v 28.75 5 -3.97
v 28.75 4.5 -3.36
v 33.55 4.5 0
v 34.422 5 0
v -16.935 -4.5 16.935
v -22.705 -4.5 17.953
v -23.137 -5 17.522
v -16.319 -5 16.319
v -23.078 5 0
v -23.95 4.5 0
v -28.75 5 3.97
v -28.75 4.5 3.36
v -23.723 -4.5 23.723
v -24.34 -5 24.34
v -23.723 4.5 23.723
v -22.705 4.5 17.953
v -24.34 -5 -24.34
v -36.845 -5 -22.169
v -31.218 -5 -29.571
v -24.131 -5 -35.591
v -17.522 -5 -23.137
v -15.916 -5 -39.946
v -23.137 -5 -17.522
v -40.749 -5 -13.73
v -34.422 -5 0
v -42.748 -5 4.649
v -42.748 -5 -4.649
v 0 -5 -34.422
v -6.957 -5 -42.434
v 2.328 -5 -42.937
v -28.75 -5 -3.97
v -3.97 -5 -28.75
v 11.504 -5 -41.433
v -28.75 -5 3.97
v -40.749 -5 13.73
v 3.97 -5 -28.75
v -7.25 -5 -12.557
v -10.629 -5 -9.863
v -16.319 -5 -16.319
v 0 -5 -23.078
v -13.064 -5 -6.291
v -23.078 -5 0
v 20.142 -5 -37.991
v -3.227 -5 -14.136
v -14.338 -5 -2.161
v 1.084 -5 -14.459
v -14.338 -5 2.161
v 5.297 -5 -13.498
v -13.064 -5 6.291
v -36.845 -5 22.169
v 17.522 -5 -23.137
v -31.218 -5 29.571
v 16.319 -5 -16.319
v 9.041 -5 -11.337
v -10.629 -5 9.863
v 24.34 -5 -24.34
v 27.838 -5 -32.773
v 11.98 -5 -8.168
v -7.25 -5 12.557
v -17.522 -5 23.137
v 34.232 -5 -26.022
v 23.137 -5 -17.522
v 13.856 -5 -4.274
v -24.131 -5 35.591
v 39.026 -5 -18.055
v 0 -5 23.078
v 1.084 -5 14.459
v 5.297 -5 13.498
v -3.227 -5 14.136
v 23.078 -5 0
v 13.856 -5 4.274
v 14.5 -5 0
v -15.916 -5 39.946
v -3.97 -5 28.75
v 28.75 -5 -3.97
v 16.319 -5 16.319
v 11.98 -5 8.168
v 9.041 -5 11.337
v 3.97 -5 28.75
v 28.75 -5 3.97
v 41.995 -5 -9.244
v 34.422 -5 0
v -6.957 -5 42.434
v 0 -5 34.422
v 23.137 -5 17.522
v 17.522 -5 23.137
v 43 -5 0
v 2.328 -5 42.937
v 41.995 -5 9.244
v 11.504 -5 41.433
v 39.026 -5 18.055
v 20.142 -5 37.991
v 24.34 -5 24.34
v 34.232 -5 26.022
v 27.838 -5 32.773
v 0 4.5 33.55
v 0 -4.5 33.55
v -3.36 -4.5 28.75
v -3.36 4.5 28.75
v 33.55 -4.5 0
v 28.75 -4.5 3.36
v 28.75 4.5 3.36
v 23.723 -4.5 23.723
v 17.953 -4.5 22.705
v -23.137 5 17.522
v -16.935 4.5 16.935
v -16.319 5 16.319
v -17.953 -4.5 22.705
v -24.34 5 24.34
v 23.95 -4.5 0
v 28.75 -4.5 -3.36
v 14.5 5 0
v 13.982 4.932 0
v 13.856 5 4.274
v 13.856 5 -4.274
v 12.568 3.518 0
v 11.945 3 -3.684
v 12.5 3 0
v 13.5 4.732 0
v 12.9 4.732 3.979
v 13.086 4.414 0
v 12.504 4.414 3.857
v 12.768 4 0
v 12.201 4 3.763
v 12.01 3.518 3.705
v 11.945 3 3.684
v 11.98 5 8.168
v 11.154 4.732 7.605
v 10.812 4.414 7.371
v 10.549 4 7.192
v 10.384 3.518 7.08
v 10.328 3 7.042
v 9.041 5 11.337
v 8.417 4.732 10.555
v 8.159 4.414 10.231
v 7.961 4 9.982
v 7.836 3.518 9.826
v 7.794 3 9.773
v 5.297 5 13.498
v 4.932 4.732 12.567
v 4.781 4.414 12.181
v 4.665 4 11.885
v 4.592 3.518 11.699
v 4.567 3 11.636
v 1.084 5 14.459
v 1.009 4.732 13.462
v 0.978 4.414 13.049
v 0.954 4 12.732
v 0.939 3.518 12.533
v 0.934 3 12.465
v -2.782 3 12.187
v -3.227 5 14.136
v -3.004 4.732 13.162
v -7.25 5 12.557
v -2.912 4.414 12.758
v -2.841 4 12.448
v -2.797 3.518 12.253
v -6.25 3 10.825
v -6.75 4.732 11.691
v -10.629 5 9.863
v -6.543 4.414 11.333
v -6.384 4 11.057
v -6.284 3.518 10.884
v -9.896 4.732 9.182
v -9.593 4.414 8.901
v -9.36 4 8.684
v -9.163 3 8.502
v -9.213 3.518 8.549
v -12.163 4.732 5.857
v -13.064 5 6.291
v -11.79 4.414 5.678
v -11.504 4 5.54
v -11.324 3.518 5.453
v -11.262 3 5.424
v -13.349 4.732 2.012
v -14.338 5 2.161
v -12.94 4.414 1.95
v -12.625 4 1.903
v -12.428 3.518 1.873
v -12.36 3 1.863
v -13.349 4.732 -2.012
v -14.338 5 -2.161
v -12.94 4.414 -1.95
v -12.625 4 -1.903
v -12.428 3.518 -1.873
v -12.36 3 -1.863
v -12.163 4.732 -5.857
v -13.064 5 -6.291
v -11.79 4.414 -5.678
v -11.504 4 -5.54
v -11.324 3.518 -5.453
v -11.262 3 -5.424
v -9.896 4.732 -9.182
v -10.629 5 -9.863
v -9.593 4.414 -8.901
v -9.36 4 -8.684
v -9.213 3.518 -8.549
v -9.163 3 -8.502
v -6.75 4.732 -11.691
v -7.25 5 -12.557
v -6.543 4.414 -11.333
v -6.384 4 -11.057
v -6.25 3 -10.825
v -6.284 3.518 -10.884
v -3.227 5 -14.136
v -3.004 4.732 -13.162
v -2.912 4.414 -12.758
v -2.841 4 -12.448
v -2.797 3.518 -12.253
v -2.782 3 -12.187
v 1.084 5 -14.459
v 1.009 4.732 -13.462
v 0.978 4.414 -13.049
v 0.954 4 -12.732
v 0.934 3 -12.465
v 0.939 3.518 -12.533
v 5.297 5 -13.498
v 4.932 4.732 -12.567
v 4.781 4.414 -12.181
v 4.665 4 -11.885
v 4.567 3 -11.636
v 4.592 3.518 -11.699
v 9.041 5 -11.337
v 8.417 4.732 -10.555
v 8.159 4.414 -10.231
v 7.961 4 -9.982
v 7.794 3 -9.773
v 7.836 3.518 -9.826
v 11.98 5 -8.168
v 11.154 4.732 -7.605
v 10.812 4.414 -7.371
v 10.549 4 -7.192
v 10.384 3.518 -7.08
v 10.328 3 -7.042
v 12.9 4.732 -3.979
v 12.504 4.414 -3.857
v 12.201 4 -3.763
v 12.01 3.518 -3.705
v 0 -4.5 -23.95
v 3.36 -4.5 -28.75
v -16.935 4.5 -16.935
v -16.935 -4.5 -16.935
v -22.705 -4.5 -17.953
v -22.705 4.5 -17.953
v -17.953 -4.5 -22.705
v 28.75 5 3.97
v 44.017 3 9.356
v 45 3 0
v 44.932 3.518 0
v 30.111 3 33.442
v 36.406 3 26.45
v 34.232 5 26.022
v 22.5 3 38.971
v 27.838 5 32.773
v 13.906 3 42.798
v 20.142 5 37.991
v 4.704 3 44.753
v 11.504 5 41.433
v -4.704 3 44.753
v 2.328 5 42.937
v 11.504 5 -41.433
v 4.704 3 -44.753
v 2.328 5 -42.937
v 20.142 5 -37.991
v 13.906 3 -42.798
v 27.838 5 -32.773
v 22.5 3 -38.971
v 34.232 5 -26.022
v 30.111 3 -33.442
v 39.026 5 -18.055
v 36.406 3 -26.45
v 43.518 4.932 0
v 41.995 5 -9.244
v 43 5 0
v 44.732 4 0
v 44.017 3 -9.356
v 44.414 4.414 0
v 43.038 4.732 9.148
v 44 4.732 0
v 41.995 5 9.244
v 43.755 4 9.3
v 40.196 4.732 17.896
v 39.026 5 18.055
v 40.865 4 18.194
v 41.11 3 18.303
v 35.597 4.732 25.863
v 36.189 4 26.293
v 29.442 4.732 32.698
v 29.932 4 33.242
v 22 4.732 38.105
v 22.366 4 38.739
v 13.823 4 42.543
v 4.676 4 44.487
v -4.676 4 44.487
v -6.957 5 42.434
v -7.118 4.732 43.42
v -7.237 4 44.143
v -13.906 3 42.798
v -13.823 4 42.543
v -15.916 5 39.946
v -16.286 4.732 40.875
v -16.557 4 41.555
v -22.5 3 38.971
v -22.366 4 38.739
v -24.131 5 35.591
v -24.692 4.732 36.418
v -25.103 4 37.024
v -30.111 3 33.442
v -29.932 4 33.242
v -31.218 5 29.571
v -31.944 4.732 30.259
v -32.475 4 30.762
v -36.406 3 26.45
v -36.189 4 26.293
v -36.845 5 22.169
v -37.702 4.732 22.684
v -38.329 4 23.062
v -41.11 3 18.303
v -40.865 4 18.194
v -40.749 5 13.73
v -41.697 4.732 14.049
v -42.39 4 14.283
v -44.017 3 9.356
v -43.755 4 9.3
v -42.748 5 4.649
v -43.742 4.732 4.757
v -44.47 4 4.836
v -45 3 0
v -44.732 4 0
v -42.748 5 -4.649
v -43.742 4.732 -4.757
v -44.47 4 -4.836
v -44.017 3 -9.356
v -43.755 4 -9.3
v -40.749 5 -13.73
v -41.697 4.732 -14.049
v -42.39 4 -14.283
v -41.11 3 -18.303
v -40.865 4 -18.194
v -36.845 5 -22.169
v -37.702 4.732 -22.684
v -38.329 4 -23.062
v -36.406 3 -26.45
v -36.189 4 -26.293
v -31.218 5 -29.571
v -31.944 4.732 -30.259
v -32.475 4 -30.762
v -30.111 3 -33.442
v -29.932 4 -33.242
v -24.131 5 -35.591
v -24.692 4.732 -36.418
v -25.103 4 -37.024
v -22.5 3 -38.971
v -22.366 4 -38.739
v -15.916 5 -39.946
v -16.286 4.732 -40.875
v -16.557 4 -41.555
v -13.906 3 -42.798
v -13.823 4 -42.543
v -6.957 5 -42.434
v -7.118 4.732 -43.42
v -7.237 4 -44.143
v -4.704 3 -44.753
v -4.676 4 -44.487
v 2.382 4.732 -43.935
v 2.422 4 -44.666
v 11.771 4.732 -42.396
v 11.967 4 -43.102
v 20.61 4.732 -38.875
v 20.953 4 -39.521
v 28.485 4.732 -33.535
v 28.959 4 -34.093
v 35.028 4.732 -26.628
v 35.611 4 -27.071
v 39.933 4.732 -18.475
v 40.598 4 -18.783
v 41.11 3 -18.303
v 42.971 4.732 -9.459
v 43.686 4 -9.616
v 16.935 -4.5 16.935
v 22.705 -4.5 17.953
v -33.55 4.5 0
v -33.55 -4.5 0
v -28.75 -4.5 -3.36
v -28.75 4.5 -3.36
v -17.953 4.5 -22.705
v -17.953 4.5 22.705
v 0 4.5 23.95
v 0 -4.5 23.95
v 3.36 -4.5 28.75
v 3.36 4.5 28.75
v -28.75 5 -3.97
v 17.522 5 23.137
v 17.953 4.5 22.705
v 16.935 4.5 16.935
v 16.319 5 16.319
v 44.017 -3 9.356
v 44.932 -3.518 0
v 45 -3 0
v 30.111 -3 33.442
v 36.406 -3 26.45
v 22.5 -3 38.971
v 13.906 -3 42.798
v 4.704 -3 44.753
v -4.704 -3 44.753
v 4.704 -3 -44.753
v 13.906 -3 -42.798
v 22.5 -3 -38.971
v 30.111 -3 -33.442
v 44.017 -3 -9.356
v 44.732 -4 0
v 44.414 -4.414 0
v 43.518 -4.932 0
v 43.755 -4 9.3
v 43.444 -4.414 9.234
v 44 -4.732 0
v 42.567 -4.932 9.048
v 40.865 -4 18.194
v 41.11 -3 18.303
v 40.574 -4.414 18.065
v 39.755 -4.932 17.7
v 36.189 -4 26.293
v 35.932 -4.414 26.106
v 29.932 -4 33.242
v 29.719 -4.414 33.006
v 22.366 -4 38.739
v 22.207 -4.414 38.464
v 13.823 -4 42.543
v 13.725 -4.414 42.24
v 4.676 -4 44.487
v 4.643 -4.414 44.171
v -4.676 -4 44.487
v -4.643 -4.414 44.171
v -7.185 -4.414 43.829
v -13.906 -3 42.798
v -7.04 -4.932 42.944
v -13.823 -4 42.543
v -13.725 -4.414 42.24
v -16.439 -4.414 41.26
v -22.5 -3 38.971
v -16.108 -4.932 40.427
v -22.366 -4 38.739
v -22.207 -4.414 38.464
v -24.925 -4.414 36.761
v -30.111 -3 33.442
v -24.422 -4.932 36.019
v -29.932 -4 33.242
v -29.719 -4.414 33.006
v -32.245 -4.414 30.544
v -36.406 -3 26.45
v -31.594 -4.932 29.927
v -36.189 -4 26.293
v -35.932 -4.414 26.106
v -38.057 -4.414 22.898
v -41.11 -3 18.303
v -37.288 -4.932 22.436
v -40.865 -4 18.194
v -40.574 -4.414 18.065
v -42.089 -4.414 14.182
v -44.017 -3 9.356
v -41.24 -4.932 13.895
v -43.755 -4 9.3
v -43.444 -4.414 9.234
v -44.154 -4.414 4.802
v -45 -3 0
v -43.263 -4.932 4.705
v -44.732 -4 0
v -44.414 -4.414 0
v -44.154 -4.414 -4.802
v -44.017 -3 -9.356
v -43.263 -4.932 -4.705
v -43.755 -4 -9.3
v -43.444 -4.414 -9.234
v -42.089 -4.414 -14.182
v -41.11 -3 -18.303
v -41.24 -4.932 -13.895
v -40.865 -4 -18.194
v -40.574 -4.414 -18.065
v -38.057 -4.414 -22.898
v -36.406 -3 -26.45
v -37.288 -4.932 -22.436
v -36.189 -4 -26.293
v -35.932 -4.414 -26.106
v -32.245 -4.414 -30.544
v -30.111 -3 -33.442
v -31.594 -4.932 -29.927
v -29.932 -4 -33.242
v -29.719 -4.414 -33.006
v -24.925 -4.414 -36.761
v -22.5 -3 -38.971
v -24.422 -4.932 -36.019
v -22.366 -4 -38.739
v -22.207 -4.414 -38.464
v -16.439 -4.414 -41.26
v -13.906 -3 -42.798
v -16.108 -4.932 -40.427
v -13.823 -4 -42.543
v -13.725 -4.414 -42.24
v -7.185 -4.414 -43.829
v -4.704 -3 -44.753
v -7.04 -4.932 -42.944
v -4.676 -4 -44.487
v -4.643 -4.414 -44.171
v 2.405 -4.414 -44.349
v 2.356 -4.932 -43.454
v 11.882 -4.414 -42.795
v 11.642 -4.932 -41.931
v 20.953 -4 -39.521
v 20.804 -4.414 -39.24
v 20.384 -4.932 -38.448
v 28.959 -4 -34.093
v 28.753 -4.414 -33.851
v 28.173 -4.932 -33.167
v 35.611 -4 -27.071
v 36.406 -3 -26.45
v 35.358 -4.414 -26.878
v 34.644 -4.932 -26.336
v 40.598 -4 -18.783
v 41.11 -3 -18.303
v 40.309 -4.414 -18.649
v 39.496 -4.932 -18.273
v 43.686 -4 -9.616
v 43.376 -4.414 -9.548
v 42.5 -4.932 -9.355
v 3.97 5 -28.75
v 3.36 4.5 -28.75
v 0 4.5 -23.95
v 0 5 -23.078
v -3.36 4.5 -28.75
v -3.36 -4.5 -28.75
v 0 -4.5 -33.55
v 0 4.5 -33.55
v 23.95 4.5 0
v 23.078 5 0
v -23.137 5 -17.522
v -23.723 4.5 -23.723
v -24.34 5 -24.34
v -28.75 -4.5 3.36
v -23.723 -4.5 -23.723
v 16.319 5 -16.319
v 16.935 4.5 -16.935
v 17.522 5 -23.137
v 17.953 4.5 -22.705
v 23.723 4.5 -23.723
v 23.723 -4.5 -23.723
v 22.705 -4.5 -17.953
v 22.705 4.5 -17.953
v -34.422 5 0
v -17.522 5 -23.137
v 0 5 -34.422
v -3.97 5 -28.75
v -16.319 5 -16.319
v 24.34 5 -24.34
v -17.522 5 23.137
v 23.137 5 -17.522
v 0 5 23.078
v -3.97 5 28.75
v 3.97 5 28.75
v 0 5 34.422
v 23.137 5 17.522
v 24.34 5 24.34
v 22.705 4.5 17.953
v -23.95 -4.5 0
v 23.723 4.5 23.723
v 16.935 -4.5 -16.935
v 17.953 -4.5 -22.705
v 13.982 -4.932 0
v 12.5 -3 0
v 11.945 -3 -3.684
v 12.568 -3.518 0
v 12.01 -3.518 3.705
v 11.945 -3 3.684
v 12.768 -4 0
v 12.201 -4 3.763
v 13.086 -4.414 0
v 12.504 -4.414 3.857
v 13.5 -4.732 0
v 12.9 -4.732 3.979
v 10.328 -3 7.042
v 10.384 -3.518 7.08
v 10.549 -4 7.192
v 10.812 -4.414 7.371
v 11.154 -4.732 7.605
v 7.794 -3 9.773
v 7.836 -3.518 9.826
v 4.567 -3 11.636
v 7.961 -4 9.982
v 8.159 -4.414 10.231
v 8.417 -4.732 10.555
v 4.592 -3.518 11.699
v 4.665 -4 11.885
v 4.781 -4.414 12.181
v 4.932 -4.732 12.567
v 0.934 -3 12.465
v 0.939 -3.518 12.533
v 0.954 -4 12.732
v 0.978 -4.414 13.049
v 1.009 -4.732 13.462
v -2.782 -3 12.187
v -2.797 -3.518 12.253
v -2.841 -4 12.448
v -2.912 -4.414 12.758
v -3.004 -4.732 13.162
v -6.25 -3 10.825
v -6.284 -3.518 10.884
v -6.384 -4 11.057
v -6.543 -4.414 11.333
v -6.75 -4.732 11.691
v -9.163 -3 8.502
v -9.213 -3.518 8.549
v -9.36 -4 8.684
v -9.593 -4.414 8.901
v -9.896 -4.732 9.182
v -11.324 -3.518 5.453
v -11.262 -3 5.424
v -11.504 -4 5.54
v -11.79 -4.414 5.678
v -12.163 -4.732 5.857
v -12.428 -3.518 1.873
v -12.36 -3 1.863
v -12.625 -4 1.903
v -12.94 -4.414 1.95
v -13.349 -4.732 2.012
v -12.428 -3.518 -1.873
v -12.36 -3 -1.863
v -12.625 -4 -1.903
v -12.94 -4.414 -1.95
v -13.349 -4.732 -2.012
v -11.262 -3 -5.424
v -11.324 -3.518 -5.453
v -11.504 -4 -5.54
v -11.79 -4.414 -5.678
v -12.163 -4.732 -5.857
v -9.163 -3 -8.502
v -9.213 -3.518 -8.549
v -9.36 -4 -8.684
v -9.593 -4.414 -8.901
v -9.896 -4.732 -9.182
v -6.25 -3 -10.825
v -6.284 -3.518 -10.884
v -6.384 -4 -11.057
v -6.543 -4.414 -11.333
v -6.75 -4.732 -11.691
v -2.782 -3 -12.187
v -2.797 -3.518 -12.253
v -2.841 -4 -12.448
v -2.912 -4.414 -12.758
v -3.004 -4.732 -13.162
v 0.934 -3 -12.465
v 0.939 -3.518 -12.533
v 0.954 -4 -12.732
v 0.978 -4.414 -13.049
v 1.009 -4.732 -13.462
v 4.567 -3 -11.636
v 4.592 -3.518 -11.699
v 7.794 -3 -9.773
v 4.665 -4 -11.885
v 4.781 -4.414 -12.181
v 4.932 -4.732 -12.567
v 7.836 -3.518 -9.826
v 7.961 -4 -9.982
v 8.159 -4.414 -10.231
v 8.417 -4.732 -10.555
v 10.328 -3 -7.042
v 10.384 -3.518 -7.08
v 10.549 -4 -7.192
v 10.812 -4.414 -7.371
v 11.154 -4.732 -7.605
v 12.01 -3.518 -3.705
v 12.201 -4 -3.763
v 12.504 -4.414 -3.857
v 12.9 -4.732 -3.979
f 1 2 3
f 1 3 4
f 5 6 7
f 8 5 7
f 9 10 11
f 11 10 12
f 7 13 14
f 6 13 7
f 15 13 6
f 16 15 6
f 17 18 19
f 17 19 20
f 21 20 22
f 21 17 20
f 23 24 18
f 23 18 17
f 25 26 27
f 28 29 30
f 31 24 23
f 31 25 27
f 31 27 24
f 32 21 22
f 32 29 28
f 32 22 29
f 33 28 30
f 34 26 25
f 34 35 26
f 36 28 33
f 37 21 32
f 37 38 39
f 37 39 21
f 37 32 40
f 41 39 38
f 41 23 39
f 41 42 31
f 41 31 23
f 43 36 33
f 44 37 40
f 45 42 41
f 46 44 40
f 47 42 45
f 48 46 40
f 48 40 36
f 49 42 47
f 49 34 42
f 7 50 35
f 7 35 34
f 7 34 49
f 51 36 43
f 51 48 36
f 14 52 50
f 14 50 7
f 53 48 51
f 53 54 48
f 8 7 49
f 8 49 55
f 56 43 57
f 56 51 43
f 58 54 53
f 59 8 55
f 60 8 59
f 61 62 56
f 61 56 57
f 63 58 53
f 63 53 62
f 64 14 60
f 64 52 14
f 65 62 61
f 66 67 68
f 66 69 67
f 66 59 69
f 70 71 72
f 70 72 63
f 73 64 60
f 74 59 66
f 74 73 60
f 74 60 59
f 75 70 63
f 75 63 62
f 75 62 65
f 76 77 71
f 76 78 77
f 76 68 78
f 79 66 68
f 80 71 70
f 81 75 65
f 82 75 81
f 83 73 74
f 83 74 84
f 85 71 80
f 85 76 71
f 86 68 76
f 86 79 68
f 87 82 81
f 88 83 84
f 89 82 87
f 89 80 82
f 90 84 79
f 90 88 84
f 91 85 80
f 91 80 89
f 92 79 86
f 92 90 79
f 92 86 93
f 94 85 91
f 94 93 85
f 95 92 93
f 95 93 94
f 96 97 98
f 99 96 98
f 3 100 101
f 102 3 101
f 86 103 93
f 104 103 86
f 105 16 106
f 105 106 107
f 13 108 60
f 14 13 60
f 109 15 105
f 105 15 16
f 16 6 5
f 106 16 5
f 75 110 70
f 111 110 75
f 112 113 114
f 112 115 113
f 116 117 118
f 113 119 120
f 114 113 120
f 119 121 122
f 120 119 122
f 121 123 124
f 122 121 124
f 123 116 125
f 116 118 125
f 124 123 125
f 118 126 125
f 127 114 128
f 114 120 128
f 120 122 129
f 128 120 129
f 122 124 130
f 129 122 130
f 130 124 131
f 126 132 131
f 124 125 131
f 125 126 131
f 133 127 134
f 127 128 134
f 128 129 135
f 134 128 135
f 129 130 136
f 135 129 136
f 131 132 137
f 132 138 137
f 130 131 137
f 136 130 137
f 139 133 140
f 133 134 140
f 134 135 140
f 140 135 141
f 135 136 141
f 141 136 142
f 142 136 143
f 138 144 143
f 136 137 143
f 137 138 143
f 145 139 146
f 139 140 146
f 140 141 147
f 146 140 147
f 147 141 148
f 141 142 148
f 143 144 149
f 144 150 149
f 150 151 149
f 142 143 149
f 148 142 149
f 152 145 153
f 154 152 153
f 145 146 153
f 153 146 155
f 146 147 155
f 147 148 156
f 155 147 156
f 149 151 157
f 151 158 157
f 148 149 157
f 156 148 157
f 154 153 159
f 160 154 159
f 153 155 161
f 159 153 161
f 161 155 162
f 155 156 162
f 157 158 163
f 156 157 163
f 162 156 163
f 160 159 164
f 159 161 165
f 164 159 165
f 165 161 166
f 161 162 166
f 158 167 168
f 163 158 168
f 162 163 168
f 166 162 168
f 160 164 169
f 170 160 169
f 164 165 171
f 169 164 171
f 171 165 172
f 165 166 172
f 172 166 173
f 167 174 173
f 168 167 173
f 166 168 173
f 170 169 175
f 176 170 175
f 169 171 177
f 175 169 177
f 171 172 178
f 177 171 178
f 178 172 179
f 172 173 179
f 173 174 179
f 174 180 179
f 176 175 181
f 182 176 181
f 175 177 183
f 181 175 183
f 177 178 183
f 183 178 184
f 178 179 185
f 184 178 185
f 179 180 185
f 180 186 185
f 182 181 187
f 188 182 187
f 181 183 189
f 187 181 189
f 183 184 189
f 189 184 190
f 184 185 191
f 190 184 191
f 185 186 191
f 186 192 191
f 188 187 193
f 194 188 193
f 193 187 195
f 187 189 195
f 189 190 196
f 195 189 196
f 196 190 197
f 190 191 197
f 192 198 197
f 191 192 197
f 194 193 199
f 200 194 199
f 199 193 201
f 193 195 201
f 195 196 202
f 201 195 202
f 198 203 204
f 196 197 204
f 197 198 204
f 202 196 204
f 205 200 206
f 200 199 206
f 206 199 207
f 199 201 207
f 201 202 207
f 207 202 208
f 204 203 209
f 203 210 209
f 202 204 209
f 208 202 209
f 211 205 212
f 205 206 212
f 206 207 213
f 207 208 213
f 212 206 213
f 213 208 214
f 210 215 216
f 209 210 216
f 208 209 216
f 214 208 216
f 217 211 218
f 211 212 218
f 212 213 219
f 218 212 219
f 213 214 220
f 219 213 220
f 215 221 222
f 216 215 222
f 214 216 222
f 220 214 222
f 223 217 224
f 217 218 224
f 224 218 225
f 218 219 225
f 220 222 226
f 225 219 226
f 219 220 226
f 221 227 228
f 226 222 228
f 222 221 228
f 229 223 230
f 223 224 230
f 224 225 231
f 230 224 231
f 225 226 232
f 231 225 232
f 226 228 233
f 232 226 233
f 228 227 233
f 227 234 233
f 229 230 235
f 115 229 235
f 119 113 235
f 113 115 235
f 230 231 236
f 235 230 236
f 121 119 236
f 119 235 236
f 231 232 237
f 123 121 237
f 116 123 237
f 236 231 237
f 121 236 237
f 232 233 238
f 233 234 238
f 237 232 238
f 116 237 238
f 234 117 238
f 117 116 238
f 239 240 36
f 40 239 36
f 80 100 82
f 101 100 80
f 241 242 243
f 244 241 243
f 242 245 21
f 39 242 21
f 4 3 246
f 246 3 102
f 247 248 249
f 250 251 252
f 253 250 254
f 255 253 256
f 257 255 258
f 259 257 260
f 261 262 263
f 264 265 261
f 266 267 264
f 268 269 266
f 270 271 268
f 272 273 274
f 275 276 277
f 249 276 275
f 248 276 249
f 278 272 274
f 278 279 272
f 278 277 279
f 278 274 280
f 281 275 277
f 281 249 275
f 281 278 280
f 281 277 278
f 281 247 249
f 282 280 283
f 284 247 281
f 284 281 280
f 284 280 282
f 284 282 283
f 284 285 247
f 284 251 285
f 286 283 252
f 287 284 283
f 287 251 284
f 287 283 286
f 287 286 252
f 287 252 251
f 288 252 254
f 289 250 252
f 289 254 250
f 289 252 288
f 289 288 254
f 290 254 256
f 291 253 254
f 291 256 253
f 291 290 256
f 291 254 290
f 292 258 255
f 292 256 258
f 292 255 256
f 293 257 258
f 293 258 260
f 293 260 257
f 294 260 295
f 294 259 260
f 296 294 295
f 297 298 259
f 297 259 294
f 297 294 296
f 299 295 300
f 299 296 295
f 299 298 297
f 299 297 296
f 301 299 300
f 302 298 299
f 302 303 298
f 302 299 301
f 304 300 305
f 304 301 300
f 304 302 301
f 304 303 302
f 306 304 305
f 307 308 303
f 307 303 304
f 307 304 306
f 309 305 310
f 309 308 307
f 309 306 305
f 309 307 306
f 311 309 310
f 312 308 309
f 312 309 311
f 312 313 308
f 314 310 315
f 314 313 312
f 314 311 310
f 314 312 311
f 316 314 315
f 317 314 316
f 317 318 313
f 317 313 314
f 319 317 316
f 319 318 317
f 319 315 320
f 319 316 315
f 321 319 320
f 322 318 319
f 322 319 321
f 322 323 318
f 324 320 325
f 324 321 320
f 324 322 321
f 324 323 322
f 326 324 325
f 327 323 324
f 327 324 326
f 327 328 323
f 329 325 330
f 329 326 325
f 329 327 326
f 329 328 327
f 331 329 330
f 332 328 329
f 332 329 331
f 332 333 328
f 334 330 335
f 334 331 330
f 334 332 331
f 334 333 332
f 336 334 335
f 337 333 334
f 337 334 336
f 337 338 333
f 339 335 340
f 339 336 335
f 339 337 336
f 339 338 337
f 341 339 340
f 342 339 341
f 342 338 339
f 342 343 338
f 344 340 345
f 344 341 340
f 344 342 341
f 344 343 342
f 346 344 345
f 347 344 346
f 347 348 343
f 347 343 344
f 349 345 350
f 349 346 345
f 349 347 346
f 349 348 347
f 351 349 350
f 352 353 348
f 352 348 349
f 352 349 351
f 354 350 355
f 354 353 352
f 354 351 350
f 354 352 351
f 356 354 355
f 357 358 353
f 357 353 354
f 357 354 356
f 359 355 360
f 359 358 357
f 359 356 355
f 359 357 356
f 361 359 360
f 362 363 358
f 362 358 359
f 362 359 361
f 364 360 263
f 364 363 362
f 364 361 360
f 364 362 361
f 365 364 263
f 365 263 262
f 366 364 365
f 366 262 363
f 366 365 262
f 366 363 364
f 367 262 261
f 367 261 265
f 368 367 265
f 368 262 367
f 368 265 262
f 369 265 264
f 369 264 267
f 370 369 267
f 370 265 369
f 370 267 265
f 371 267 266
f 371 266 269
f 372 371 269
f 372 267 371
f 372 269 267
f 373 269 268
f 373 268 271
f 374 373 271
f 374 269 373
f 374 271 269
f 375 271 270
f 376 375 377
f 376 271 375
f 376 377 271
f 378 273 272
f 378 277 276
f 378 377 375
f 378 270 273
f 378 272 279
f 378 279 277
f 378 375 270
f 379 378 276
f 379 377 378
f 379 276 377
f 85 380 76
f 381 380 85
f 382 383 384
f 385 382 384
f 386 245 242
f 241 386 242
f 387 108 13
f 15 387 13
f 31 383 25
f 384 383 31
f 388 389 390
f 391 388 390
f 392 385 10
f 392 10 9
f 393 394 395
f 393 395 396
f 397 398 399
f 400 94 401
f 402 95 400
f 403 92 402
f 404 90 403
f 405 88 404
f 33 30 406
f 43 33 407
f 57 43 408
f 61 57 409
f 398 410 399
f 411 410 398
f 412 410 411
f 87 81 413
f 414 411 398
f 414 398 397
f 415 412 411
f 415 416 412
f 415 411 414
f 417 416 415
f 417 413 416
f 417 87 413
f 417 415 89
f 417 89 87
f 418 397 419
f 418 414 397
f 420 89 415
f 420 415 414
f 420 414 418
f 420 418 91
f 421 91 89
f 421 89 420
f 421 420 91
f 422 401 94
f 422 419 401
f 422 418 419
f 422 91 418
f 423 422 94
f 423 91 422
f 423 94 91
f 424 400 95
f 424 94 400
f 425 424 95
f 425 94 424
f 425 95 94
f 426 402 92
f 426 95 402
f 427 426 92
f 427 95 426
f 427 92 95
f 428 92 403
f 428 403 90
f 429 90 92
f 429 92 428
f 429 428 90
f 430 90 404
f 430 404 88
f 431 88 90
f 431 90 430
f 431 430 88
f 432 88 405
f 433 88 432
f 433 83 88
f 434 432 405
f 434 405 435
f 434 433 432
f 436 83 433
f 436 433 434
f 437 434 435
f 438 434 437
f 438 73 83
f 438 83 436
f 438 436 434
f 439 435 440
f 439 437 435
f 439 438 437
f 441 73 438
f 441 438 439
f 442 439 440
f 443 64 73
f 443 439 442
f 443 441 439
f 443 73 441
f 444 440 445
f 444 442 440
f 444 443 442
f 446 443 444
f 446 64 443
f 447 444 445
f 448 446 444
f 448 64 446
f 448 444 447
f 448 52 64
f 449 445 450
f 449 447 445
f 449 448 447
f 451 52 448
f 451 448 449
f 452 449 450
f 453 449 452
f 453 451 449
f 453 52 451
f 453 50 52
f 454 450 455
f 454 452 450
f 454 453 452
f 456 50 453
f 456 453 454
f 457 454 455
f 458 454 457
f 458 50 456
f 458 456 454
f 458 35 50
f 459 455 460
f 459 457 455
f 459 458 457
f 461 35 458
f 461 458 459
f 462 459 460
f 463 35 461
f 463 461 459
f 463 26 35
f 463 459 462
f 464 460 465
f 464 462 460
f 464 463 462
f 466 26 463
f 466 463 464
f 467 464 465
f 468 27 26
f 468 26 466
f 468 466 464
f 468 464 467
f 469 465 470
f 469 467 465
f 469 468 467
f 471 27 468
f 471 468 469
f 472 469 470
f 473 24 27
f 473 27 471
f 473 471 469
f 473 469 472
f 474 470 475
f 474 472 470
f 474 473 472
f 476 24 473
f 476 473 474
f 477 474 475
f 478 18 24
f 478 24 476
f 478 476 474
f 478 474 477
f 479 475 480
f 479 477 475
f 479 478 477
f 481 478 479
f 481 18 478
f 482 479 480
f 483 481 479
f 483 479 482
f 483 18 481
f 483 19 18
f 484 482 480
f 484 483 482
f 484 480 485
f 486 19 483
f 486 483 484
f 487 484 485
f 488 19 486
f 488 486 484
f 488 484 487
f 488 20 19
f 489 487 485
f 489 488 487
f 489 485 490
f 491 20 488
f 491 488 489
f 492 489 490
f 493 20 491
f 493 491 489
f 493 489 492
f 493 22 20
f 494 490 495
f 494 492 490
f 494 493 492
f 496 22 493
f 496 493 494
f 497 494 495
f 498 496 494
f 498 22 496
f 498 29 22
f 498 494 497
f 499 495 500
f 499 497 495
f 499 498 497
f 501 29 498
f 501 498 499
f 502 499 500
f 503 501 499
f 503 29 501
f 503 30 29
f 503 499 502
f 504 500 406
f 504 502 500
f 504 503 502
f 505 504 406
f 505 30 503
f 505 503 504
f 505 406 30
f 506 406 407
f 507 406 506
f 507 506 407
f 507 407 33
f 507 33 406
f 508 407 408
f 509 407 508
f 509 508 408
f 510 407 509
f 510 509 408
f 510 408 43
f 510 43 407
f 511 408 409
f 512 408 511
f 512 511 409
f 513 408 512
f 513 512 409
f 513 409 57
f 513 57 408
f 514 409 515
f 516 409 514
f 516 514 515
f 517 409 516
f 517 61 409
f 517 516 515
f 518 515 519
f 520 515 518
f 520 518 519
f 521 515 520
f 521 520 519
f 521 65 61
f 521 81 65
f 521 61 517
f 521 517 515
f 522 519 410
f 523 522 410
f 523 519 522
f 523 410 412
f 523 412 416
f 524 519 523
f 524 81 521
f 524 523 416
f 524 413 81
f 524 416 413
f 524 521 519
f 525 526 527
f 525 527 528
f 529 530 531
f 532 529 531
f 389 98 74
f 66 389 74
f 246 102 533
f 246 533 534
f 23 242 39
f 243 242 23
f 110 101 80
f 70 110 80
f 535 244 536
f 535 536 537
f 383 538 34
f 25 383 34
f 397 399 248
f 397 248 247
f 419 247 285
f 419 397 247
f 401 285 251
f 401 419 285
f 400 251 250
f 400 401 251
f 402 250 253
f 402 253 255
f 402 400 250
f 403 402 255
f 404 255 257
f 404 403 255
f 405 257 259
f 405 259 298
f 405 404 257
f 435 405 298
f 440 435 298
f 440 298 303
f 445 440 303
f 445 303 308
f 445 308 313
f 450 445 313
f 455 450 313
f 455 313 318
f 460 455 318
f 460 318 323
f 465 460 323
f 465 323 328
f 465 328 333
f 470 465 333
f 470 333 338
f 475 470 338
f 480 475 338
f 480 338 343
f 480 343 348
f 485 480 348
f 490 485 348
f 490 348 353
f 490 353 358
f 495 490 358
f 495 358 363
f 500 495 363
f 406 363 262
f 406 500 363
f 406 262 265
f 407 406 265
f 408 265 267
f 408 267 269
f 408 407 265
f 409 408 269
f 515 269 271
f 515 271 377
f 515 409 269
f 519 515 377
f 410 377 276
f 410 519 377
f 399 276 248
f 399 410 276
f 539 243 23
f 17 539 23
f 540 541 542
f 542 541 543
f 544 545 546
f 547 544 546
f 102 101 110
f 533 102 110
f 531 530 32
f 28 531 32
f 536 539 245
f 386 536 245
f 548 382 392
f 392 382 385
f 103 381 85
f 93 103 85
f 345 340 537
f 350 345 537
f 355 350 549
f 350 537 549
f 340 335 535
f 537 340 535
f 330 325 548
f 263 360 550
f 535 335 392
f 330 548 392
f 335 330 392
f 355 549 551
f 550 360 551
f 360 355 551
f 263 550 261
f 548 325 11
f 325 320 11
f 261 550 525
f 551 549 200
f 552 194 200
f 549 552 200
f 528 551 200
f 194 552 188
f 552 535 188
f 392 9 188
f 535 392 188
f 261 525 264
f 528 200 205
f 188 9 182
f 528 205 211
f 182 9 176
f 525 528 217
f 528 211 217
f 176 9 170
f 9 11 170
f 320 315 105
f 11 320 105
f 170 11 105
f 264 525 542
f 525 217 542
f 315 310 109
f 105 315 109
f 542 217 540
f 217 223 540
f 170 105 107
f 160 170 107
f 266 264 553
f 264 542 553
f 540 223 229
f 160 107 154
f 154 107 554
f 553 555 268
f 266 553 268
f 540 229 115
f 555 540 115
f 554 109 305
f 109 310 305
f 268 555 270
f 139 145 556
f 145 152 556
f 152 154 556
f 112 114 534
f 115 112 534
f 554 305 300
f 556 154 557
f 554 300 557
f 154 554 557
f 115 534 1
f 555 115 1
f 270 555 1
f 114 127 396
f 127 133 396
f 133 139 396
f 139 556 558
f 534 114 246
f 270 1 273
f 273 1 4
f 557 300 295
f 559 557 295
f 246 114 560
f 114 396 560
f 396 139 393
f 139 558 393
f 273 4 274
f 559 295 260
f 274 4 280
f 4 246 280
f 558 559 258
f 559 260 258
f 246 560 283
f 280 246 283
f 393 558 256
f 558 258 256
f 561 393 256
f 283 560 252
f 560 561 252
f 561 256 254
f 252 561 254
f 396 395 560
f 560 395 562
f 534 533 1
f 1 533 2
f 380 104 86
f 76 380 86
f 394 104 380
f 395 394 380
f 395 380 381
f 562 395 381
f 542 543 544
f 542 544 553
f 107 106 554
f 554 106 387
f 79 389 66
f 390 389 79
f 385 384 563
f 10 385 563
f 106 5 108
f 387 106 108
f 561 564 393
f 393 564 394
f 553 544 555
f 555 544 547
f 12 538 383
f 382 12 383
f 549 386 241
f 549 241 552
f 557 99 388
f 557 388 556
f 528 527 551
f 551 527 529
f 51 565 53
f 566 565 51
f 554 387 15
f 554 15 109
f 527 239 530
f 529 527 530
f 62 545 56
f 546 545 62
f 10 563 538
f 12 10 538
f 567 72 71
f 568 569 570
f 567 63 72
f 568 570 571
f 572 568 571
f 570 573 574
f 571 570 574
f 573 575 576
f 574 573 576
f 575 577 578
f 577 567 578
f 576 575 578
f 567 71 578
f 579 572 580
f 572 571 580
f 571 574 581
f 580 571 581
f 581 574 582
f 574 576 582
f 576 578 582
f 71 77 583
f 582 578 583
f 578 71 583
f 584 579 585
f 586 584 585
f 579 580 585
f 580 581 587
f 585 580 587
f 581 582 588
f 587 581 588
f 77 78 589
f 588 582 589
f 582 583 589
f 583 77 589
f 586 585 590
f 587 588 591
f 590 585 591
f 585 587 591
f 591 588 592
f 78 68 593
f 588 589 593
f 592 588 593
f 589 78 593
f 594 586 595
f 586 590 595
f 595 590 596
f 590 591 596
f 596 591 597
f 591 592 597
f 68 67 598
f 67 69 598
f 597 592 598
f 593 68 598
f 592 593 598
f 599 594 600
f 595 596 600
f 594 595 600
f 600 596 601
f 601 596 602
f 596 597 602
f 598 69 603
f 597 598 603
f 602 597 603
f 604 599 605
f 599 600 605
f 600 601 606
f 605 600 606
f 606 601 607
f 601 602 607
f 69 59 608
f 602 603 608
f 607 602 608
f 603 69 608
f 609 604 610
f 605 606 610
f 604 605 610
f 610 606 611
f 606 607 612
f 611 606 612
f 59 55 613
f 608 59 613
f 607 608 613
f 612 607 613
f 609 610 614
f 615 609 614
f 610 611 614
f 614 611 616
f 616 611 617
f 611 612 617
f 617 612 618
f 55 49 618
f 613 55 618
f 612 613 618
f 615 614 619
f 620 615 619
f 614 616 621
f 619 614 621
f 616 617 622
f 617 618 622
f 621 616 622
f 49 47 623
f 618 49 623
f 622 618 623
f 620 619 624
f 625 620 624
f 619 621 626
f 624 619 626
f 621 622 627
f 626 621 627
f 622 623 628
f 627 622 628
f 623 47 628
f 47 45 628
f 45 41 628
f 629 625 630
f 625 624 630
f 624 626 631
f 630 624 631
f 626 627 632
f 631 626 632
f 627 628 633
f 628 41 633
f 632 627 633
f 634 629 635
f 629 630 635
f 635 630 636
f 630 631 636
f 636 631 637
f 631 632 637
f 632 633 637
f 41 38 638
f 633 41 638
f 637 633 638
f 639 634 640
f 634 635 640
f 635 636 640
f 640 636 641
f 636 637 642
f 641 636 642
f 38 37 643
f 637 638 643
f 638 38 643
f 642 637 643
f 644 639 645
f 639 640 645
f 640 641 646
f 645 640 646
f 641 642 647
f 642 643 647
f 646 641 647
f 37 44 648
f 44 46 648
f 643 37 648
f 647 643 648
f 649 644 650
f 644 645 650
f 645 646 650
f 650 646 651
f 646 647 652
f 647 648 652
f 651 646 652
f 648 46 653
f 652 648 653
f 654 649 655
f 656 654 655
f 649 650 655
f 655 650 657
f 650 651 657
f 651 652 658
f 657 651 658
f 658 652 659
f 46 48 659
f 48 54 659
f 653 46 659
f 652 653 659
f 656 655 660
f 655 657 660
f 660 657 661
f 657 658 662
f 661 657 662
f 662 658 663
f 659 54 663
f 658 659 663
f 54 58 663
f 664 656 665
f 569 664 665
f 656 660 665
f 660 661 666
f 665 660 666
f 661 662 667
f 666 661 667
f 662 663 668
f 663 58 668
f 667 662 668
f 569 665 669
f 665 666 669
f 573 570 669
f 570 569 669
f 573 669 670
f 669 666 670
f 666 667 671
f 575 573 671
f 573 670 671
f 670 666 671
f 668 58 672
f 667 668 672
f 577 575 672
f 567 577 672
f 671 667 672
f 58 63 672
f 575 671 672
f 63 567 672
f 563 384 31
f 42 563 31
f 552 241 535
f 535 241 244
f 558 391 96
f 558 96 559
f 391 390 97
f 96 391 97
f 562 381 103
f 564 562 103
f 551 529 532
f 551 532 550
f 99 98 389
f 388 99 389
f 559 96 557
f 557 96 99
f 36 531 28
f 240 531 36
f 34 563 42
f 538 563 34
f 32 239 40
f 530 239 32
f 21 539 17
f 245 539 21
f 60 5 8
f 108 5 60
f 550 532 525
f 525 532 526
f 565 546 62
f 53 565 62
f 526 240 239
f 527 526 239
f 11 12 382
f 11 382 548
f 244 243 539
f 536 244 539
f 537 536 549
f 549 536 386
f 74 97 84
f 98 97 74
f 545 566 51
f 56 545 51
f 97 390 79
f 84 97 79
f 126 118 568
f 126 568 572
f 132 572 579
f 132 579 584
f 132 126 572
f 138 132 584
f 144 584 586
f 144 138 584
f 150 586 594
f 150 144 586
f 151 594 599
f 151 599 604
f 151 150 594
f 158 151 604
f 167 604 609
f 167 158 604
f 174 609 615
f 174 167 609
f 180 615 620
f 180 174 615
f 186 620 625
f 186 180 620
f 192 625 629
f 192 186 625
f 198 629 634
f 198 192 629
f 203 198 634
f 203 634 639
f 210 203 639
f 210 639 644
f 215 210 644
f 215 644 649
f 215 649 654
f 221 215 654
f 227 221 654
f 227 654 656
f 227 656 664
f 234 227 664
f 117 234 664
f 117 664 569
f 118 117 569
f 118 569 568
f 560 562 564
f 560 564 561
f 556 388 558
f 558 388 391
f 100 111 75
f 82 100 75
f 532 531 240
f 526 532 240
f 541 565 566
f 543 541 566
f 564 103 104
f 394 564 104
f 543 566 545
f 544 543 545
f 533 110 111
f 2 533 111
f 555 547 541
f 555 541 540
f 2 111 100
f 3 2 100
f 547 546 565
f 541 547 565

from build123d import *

# Parameters (mm, degrees)
F0_R            = 45
F0_R_2          = 12.5
F1_DEPTH        = 5
F3_DEPTH        = 10.001
F3_COPIES_COUNT = 8
F4_SIZE         = 0.5
F5_R            = 2


# Not quite as in the source:
# - a pattern or mirror of a feature is missing from the dataset's text; its kind, count and spacing are read off the source's solid


with BuildPart() as f1:
    # F0 (on Front) → F1 (new body, symmetric)
    with BuildSketch(Plane.XZ):
        Circle(F0_R)
        Circle(F0_R_2, mode=Mode.SUBTRACT)
    extrude(amount=F1_DEPTH, both=True)

    # F2 (on face) → F3 (cut, through all)
    with BuildSketch(Plane.XZ.offset(5)):
        Polygon((3.36, 28.75), (0, 33.55), (-3.36, 28.75), (0, 23.95), align=None)
    f3 = extrude(amount=-F3_DEPTH, mode=Mode.SUBTRACT)

    # F3_copies: F3 ×8 about axis
    f3_copies_axis = Axis((0, 0, 0), (0, 1, 0))
    for i in range(1, F3_COPIES_COUNT):
        add(f3.rotate(f3_copies_axis, i * 360 / F3_COPIES_COUNT), mode=Mode.SUBTRACT)

    # F4
    f4_edges = [f1.edges().sort_by_distance(p)[0] for p in [
        (1.68, -5, 31.15),
        (-1.68, -5, 31.15),
        (-1.68, -5, 26.35),
        (1.68, -5, 26.35),
        (1.68, 5, 31.15),
        (-1.68, 5, 31.15),
        (-1.68, 5, 26.35),
        (1.68, 5, 26.35),
        (-23.214316, 5, -20.838437),
        (-19.820203, 5, -17.444324),
        (-20.838437, 5, -23.214316),
        (-17.444324, 5, -19.820203),
        (-31.15, 5, 1.68),
        (-26.35, 5, 1.68),
        (-31.15, 5, -1.68),
        (-26.35, 5, -1.68),
        (-1.68, 5, -31.15),
        (-1.68, 5, -26.35),
        (1.68, 5, -31.15),
        (1.68, 5, -26.35),
        (20.838437, 5, -23.214316),
        (17.444324, 5, -19.820203),
        (23.214316, 5, -20.838437),
        (19.820203, 5, -17.444324),
        (-20.838437, 5, 23.214316),
        (-23.214316, 5, 20.838437),
        (-19.820203, 5, 17.444324),
        (-17.444324, 5, 19.820203),
        (31.15, 5, -1.68),
        (26.35, 5, -1.68),
        (31.15, 5, 1.68),
        (26.35, 5, 1.68),
        (23.214316, 5, 20.838437),
        (19.820203, 5, 17.444324),
        (20.838437, 5, 23.214316),
        (17.444324, 5, 19.820203),
        (-23.214316, -5, -20.838437),
        (-19.820203, -5, -17.444324),
        (-20.838437, -5, -23.214316),
        (-17.444324, -5, -19.820203),
        (-31.15, -5, 1.68),
        (-26.35, -5, 1.68),
        (-31.15, -5, -1.68),
        (-26.35, -5, -1.68),
        (-1.68, -5, -31.15),
        (-1.68, -5, -26.35),
        (1.68, -5, -31.15),
        (1.68, -5, -26.35),
        (20.838437, -5, -23.214316),
        (17.444324, -5, -19.820203),
        (23.214316, -5, -20.838437),
        (19.820203, -5, -17.444324),
        (-20.838437, -5, 23.214316),
        (-23.214316, -5, 20.838437),
        (-19.820203, -5, 17.444324),
        (-17.444324, -5, 19.820203),
        (31.15, -5, -1.68),
        (26.35, -5, -1.68),
        (31.15, -5, 1.68),
        (26.35, -5, 1.68),
        (23.214316, -5, 20.838437),
        (19.820203, -5, 17.444324),
        (20.838437, -5, 23.214316),
        (17.444324, -5, 19.820203),
    ]]
    chamfer(f4_edges, length=F4_SIZE)

    # F5
    f5_edges = [f1.edges().sort_by_distance(p)[0] for p in [
        (-45, -5, 0),
        (-45, 5, 0),
        (-12.5, -5, 0),
        (12.5, 0, 0),
        (-12.5, 5, 0),
    ]]
    fillet(f5_edges, radius=F5_R)


solid = f1.part
